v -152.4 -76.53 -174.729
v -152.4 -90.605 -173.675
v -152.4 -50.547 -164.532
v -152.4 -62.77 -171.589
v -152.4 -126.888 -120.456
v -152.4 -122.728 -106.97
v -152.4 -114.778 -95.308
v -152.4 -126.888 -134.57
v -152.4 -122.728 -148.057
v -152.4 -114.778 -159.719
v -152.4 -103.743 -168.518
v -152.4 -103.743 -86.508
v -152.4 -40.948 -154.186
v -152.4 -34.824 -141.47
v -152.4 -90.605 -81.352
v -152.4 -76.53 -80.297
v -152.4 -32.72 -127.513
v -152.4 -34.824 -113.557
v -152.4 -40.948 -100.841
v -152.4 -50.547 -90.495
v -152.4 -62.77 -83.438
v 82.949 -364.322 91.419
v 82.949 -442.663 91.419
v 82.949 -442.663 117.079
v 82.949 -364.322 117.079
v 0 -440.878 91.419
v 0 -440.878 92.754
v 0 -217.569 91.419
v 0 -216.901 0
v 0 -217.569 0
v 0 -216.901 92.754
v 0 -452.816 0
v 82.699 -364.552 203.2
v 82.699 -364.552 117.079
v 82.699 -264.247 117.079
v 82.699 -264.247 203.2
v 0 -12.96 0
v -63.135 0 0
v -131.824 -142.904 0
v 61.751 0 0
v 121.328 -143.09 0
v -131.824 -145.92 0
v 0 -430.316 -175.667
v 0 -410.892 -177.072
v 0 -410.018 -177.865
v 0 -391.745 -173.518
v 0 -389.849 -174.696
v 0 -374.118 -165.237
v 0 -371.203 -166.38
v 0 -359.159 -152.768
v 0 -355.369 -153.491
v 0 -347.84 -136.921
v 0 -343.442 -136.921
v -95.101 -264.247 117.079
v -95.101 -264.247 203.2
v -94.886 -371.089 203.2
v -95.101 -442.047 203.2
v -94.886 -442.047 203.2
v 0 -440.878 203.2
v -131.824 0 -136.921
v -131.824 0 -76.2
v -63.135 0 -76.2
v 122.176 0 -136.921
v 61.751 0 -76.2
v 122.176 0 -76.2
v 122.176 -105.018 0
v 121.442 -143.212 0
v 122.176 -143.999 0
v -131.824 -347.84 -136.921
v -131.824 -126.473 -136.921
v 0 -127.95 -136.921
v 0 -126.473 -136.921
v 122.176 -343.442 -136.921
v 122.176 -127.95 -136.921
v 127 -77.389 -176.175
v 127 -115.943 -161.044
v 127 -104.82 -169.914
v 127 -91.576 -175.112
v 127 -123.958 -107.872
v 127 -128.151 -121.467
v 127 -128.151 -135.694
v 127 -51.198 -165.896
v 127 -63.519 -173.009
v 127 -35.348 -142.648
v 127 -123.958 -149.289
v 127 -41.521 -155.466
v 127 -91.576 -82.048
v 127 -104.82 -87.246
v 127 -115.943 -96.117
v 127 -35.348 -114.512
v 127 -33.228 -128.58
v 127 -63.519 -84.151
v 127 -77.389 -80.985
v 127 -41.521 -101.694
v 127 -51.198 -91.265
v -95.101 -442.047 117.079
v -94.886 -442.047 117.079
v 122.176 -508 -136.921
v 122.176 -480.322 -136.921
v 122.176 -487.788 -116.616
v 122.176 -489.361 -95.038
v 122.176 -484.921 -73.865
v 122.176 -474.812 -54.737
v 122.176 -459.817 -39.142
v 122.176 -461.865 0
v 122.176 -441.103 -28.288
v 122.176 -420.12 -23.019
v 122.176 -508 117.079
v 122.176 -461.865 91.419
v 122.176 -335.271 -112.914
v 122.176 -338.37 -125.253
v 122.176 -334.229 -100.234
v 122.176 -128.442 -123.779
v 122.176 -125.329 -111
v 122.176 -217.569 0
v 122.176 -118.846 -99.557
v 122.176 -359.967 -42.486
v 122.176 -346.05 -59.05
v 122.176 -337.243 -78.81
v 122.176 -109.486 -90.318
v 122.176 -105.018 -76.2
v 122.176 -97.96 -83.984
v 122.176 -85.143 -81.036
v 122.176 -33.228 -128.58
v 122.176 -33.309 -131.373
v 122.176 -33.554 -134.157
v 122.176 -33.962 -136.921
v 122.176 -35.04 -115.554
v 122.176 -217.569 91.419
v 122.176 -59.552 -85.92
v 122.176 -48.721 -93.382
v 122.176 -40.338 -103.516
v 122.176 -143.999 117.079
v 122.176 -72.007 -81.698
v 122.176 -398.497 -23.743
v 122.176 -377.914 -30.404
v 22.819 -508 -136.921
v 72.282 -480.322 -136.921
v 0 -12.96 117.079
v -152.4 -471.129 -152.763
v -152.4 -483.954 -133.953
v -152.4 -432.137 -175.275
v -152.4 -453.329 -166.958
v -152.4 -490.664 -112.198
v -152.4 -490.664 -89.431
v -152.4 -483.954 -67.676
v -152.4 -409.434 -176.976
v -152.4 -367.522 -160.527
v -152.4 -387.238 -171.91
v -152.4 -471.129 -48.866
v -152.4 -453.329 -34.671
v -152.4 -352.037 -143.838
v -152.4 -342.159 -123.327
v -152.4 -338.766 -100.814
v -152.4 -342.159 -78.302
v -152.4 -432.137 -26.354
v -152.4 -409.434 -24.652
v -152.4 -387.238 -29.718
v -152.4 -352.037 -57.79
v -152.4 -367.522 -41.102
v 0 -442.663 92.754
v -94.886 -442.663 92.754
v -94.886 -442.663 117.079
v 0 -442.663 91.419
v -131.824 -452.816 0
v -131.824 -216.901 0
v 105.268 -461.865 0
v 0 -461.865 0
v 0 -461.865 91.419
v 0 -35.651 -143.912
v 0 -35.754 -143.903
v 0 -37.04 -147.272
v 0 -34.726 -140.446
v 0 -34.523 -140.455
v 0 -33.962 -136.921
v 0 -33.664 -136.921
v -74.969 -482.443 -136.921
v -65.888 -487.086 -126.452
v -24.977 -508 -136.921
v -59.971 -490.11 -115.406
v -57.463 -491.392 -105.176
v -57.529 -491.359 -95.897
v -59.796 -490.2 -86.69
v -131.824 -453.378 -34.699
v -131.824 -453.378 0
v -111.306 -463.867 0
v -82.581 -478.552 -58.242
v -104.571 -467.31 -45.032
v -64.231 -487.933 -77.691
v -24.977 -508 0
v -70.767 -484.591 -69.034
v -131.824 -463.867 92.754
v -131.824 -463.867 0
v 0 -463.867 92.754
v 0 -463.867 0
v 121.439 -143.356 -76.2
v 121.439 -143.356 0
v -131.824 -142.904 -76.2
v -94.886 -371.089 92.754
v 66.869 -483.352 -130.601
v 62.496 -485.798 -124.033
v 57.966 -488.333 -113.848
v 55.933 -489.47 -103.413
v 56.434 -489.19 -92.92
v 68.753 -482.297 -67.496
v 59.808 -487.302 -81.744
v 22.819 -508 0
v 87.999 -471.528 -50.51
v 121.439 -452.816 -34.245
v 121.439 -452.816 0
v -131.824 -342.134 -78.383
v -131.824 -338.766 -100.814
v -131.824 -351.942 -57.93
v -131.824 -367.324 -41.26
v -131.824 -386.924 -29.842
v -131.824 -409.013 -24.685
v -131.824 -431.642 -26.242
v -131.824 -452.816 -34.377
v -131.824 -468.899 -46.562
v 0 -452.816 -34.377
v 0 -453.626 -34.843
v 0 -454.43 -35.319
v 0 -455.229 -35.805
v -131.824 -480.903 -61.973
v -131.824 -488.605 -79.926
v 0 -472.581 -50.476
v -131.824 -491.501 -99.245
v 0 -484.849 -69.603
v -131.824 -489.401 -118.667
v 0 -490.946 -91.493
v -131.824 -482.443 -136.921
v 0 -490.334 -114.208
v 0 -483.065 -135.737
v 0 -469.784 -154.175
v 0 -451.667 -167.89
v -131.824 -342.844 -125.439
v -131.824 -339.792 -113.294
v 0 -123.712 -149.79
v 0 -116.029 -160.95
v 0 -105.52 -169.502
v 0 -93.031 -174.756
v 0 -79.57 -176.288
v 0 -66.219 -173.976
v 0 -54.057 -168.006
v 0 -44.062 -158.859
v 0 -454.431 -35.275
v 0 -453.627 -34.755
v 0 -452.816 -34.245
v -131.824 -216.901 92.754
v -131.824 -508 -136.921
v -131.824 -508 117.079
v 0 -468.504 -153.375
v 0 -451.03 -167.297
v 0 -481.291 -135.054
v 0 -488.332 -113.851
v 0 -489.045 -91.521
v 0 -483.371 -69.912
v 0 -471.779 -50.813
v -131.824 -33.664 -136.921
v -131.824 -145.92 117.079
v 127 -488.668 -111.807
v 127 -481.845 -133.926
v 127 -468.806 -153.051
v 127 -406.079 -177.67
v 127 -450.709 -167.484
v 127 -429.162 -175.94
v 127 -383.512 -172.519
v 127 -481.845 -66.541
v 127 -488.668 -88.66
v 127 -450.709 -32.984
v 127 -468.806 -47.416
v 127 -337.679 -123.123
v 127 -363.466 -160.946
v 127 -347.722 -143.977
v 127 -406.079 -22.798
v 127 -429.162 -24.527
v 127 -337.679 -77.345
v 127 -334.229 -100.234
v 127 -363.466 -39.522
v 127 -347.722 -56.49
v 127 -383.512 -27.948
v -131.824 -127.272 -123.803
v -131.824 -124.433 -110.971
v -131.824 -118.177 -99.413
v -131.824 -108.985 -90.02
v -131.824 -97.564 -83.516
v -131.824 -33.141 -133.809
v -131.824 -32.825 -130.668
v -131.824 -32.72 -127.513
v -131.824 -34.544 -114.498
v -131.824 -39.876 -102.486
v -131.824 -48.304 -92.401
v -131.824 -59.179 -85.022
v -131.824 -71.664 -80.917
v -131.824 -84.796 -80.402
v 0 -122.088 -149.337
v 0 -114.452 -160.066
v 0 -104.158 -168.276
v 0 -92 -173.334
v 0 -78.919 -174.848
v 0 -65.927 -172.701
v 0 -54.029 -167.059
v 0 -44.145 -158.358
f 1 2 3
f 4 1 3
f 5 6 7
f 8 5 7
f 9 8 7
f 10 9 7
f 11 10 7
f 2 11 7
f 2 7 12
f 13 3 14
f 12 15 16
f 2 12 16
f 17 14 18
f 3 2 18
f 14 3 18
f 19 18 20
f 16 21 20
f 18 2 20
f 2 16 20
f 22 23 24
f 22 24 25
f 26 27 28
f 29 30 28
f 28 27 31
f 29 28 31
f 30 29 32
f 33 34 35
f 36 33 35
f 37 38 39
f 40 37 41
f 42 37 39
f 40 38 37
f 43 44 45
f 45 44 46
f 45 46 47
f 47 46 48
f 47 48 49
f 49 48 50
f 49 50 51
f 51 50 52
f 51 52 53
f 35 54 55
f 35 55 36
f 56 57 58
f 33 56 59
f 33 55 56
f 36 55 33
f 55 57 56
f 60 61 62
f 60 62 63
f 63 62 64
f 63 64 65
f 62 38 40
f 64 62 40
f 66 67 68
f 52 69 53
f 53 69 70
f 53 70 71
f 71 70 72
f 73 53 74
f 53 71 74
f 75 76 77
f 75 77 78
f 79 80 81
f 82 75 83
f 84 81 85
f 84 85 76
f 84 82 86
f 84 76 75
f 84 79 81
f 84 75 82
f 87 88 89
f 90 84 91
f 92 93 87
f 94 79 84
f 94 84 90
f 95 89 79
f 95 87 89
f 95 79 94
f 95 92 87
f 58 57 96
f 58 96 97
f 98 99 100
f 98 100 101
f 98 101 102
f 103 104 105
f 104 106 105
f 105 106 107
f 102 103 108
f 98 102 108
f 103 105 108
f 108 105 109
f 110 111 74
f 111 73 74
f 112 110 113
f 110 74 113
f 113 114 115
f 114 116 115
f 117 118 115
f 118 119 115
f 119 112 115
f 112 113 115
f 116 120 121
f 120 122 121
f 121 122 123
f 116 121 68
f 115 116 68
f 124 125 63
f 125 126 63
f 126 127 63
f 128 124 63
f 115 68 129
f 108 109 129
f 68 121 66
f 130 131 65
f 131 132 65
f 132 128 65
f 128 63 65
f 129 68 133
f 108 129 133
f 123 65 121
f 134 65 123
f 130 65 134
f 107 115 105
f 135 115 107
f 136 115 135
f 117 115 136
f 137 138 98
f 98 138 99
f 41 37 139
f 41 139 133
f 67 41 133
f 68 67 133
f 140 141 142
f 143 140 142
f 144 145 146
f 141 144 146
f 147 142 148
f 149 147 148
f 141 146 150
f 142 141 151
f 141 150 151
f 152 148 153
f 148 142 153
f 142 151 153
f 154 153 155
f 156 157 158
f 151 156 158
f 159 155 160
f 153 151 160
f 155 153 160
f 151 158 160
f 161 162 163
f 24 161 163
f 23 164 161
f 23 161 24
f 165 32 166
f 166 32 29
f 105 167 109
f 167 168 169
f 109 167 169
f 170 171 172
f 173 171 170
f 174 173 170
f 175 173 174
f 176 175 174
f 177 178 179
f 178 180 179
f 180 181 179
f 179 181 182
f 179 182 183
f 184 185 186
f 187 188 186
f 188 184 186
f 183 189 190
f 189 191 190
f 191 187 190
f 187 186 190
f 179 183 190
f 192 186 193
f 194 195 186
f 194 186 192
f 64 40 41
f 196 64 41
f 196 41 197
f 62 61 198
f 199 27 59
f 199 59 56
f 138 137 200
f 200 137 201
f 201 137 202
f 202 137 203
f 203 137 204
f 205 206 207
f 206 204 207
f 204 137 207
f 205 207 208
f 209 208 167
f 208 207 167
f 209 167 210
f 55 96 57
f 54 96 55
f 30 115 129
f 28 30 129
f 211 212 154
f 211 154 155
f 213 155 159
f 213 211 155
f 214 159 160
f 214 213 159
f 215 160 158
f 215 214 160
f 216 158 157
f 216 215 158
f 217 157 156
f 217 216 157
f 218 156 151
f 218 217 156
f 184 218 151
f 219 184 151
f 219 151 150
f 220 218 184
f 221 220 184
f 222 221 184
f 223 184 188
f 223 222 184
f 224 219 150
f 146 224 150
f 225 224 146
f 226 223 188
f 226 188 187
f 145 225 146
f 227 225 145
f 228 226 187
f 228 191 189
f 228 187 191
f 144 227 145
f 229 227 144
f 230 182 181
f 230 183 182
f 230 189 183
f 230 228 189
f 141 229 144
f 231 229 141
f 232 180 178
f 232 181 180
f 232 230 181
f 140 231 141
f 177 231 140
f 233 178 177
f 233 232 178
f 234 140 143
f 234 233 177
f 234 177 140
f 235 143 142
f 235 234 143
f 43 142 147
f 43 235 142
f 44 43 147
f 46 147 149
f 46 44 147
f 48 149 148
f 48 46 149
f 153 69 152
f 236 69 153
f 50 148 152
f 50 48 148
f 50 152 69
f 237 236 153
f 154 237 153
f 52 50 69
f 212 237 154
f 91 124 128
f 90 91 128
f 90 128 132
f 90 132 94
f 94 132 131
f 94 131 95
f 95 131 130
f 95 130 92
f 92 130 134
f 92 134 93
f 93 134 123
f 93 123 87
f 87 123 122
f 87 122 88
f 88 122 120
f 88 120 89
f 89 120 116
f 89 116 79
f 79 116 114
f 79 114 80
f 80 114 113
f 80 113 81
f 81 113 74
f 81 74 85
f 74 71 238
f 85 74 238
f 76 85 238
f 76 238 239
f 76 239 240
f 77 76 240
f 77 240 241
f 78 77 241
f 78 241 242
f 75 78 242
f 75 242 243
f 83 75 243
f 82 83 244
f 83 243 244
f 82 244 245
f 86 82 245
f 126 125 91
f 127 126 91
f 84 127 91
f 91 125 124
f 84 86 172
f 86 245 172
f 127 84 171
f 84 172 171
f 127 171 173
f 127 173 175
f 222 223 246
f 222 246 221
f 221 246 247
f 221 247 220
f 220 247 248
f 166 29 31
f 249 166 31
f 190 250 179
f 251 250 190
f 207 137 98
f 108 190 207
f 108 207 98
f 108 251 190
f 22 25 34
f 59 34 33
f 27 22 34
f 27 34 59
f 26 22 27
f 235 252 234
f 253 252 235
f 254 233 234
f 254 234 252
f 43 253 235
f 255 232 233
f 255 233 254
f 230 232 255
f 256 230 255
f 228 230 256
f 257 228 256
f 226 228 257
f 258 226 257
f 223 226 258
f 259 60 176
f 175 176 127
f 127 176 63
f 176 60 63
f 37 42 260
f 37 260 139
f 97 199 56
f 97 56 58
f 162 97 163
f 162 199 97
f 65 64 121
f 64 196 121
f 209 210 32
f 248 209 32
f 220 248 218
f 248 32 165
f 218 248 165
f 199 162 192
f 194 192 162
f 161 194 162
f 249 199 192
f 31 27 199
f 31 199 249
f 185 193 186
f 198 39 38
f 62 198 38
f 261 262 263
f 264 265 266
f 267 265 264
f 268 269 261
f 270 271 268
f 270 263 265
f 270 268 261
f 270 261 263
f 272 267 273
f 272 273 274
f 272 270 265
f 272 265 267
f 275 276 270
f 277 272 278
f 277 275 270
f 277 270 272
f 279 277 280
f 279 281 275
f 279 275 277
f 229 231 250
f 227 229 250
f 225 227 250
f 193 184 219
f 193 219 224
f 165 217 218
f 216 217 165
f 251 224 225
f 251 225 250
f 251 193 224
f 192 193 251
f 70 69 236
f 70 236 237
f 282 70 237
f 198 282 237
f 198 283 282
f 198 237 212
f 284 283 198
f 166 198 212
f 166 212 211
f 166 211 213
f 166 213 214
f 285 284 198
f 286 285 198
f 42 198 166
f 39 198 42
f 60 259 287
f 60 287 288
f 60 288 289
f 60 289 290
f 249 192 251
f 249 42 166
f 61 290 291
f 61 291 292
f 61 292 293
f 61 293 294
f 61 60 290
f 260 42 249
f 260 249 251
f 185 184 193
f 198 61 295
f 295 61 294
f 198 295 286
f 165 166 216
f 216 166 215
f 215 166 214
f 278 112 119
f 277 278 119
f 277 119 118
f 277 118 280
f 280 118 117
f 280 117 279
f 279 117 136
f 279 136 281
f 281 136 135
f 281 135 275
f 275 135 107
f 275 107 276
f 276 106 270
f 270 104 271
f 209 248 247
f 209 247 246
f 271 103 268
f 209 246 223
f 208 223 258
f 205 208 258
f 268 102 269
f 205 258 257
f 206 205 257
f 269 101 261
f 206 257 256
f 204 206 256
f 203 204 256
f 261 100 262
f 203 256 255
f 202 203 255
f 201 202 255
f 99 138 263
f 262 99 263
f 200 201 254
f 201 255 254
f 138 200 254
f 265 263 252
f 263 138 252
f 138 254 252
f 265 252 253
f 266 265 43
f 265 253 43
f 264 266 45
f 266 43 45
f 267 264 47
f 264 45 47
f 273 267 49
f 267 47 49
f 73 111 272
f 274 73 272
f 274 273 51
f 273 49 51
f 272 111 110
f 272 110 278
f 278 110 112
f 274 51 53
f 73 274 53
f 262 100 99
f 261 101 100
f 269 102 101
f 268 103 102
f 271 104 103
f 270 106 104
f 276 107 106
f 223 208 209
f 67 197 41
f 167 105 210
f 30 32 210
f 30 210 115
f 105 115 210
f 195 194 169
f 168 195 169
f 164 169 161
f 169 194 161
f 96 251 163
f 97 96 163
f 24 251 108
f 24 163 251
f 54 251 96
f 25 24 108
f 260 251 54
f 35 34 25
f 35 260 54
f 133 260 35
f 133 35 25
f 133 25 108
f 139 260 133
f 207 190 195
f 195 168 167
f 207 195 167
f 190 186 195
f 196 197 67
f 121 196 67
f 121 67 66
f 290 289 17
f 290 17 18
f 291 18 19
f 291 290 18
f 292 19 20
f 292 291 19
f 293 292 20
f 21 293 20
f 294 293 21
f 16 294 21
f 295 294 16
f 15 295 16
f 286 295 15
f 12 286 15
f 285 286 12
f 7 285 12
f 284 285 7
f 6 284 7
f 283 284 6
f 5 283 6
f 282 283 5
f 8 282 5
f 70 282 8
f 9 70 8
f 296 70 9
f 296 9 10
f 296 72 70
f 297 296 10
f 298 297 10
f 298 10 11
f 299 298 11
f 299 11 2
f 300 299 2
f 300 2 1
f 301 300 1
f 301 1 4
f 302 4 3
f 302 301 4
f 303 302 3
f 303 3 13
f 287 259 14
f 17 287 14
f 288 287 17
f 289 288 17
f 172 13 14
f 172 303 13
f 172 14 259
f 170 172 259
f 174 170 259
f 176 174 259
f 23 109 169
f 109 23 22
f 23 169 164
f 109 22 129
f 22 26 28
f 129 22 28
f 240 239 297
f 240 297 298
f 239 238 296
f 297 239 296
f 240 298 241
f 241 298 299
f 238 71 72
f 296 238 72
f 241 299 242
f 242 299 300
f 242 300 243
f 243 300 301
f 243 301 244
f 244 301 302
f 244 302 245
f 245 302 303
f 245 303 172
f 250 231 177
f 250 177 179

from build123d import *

# Parameters (mm, degrees)
F0_W      = 254
F0_H      = 254
F1_DEPTH  = 508
F2_W      = 177.8
F2_H      = 177.8
F3_DEPTH  = 203.2
F5_DEPTH  = 127
F7_DEPTH  = 76.2
F9_DEPTH  = 254
F10_R     = 77.653267
F10_R_2   = 47.728315
F11_DEPTH = 127
F12_R     = 76.375648
F12_R_2   = 47.348432
F13_DEPTH = 152.4
F15_DEPTH = 203.2
F16_W     = 246.96593
F16_H     = 92.753515
F17_DEPTH = 152.4
F18_W     = 244.296044
F18_H     = 91.418564
F19_DEPTH = 152.4


with BuildPart() as f1:
    # F0 (on Front) → F1 (new body)
    with BuildSketch(Plane.XZ):
        with Locations((-4.823953, -9.921276)):
            Rectangle(F0_W, F0_H)
    extrude(amount=F1_DEPTH)

    # F2 (on Top) → F3 (join)
    with BuildSketch(Plane.XY):
        with Locations((-6.201372, -353.146609)):
            Rectangle(F2_W, F2_H)
    extrude(amount=F3_DEPTH)

    # F4 (on Top) → F5 (cut)
    with BuildSketch(Plane.XY):
        Polygon((-132.923797, -147.029117), (0, -12.960467), (0, 0), (-132.923797, 0), align=None)
        Polygon((0, 0), (0, -12.960467), (123.286948, -145.190179), (123.275883, 0), align=None)
    extrude(amount=F5_DEPTH, mode=Mode.SUBTRACT)

    # F6 (on Top) → F7 (cut)
    with BuildSketch(Plane.XY):
        Polygon((-132.923797, -145.192564), (-63.134633, 0), (-133.842081, 0), align=None)
        Polygon((61.751235, 0), (121.439323, -143.35601), (124.19416, 0), align=None)
    extrude(amount=-F7_DEPTH, mode=Mode.SUBTRACT)

    # F8 (on Top) → F9 (cut)
    with BuildSketch(Plane.XY):
        Polygon((121.439323, -452.815861), (-132.923797, -452.815861), (0, -520.768464), align=None)
    extrude(amount=-F9_DEPTH, mode=Mode.SUBTRACT)

    # F10 (on Right) → F11 (join)
    with BuildSketch(Plane.YZ):
        with Locations((-411.882162, -100.233831)):
            Circle(F10_R)
        with Locations((-80.955863, -128.580093)):
            Circle(F10_R_2)
    extrude(amount=F11_DEPTH)

    # F12 (on Right) → F13 (join)
    with BuildSketch(Plane.YZ):
        with Locations((-415.141463, -100.814395)):
            Circle(F12_R)
        with Locations((-80.068722, -127.513409)):
            Circle(F12_R_2)
    extrude(amount=-F13_DEPTH)

    # F14 (on Top) → F15 (cut)
    with BuildSketch(Plane.XY):
        Polygon((0, -440.878212), (-94.885923, -371.089071), (-94.885923, -442.663282), (82.948513, -442.663282), (82.948513, -364.321649), align=None)
    extrude(amount=F15_DEPTH, mode=Mode.SUBTRACT)

    # F16 (on Right) → F17 (cut)
    with BuildSketch(Plane.YZ):
        with Locations((-340.384193, 46.376757)):
            Rectangle(F16_W, F16_H)
    extrude(amount=-F17_DEPTH, mode=Mode.SUBTRACT)

    # F18 (on Right) → F19 (cut)
    with BuildSketch(Plane.YZ):
        with Locations((-339.716718, 45.709282)):
            Rectangle(F18_W, F18_H)
    extrude(amount=F19_DEPTH, mode=Mode.SUBTRACT)


solid = f1.part
